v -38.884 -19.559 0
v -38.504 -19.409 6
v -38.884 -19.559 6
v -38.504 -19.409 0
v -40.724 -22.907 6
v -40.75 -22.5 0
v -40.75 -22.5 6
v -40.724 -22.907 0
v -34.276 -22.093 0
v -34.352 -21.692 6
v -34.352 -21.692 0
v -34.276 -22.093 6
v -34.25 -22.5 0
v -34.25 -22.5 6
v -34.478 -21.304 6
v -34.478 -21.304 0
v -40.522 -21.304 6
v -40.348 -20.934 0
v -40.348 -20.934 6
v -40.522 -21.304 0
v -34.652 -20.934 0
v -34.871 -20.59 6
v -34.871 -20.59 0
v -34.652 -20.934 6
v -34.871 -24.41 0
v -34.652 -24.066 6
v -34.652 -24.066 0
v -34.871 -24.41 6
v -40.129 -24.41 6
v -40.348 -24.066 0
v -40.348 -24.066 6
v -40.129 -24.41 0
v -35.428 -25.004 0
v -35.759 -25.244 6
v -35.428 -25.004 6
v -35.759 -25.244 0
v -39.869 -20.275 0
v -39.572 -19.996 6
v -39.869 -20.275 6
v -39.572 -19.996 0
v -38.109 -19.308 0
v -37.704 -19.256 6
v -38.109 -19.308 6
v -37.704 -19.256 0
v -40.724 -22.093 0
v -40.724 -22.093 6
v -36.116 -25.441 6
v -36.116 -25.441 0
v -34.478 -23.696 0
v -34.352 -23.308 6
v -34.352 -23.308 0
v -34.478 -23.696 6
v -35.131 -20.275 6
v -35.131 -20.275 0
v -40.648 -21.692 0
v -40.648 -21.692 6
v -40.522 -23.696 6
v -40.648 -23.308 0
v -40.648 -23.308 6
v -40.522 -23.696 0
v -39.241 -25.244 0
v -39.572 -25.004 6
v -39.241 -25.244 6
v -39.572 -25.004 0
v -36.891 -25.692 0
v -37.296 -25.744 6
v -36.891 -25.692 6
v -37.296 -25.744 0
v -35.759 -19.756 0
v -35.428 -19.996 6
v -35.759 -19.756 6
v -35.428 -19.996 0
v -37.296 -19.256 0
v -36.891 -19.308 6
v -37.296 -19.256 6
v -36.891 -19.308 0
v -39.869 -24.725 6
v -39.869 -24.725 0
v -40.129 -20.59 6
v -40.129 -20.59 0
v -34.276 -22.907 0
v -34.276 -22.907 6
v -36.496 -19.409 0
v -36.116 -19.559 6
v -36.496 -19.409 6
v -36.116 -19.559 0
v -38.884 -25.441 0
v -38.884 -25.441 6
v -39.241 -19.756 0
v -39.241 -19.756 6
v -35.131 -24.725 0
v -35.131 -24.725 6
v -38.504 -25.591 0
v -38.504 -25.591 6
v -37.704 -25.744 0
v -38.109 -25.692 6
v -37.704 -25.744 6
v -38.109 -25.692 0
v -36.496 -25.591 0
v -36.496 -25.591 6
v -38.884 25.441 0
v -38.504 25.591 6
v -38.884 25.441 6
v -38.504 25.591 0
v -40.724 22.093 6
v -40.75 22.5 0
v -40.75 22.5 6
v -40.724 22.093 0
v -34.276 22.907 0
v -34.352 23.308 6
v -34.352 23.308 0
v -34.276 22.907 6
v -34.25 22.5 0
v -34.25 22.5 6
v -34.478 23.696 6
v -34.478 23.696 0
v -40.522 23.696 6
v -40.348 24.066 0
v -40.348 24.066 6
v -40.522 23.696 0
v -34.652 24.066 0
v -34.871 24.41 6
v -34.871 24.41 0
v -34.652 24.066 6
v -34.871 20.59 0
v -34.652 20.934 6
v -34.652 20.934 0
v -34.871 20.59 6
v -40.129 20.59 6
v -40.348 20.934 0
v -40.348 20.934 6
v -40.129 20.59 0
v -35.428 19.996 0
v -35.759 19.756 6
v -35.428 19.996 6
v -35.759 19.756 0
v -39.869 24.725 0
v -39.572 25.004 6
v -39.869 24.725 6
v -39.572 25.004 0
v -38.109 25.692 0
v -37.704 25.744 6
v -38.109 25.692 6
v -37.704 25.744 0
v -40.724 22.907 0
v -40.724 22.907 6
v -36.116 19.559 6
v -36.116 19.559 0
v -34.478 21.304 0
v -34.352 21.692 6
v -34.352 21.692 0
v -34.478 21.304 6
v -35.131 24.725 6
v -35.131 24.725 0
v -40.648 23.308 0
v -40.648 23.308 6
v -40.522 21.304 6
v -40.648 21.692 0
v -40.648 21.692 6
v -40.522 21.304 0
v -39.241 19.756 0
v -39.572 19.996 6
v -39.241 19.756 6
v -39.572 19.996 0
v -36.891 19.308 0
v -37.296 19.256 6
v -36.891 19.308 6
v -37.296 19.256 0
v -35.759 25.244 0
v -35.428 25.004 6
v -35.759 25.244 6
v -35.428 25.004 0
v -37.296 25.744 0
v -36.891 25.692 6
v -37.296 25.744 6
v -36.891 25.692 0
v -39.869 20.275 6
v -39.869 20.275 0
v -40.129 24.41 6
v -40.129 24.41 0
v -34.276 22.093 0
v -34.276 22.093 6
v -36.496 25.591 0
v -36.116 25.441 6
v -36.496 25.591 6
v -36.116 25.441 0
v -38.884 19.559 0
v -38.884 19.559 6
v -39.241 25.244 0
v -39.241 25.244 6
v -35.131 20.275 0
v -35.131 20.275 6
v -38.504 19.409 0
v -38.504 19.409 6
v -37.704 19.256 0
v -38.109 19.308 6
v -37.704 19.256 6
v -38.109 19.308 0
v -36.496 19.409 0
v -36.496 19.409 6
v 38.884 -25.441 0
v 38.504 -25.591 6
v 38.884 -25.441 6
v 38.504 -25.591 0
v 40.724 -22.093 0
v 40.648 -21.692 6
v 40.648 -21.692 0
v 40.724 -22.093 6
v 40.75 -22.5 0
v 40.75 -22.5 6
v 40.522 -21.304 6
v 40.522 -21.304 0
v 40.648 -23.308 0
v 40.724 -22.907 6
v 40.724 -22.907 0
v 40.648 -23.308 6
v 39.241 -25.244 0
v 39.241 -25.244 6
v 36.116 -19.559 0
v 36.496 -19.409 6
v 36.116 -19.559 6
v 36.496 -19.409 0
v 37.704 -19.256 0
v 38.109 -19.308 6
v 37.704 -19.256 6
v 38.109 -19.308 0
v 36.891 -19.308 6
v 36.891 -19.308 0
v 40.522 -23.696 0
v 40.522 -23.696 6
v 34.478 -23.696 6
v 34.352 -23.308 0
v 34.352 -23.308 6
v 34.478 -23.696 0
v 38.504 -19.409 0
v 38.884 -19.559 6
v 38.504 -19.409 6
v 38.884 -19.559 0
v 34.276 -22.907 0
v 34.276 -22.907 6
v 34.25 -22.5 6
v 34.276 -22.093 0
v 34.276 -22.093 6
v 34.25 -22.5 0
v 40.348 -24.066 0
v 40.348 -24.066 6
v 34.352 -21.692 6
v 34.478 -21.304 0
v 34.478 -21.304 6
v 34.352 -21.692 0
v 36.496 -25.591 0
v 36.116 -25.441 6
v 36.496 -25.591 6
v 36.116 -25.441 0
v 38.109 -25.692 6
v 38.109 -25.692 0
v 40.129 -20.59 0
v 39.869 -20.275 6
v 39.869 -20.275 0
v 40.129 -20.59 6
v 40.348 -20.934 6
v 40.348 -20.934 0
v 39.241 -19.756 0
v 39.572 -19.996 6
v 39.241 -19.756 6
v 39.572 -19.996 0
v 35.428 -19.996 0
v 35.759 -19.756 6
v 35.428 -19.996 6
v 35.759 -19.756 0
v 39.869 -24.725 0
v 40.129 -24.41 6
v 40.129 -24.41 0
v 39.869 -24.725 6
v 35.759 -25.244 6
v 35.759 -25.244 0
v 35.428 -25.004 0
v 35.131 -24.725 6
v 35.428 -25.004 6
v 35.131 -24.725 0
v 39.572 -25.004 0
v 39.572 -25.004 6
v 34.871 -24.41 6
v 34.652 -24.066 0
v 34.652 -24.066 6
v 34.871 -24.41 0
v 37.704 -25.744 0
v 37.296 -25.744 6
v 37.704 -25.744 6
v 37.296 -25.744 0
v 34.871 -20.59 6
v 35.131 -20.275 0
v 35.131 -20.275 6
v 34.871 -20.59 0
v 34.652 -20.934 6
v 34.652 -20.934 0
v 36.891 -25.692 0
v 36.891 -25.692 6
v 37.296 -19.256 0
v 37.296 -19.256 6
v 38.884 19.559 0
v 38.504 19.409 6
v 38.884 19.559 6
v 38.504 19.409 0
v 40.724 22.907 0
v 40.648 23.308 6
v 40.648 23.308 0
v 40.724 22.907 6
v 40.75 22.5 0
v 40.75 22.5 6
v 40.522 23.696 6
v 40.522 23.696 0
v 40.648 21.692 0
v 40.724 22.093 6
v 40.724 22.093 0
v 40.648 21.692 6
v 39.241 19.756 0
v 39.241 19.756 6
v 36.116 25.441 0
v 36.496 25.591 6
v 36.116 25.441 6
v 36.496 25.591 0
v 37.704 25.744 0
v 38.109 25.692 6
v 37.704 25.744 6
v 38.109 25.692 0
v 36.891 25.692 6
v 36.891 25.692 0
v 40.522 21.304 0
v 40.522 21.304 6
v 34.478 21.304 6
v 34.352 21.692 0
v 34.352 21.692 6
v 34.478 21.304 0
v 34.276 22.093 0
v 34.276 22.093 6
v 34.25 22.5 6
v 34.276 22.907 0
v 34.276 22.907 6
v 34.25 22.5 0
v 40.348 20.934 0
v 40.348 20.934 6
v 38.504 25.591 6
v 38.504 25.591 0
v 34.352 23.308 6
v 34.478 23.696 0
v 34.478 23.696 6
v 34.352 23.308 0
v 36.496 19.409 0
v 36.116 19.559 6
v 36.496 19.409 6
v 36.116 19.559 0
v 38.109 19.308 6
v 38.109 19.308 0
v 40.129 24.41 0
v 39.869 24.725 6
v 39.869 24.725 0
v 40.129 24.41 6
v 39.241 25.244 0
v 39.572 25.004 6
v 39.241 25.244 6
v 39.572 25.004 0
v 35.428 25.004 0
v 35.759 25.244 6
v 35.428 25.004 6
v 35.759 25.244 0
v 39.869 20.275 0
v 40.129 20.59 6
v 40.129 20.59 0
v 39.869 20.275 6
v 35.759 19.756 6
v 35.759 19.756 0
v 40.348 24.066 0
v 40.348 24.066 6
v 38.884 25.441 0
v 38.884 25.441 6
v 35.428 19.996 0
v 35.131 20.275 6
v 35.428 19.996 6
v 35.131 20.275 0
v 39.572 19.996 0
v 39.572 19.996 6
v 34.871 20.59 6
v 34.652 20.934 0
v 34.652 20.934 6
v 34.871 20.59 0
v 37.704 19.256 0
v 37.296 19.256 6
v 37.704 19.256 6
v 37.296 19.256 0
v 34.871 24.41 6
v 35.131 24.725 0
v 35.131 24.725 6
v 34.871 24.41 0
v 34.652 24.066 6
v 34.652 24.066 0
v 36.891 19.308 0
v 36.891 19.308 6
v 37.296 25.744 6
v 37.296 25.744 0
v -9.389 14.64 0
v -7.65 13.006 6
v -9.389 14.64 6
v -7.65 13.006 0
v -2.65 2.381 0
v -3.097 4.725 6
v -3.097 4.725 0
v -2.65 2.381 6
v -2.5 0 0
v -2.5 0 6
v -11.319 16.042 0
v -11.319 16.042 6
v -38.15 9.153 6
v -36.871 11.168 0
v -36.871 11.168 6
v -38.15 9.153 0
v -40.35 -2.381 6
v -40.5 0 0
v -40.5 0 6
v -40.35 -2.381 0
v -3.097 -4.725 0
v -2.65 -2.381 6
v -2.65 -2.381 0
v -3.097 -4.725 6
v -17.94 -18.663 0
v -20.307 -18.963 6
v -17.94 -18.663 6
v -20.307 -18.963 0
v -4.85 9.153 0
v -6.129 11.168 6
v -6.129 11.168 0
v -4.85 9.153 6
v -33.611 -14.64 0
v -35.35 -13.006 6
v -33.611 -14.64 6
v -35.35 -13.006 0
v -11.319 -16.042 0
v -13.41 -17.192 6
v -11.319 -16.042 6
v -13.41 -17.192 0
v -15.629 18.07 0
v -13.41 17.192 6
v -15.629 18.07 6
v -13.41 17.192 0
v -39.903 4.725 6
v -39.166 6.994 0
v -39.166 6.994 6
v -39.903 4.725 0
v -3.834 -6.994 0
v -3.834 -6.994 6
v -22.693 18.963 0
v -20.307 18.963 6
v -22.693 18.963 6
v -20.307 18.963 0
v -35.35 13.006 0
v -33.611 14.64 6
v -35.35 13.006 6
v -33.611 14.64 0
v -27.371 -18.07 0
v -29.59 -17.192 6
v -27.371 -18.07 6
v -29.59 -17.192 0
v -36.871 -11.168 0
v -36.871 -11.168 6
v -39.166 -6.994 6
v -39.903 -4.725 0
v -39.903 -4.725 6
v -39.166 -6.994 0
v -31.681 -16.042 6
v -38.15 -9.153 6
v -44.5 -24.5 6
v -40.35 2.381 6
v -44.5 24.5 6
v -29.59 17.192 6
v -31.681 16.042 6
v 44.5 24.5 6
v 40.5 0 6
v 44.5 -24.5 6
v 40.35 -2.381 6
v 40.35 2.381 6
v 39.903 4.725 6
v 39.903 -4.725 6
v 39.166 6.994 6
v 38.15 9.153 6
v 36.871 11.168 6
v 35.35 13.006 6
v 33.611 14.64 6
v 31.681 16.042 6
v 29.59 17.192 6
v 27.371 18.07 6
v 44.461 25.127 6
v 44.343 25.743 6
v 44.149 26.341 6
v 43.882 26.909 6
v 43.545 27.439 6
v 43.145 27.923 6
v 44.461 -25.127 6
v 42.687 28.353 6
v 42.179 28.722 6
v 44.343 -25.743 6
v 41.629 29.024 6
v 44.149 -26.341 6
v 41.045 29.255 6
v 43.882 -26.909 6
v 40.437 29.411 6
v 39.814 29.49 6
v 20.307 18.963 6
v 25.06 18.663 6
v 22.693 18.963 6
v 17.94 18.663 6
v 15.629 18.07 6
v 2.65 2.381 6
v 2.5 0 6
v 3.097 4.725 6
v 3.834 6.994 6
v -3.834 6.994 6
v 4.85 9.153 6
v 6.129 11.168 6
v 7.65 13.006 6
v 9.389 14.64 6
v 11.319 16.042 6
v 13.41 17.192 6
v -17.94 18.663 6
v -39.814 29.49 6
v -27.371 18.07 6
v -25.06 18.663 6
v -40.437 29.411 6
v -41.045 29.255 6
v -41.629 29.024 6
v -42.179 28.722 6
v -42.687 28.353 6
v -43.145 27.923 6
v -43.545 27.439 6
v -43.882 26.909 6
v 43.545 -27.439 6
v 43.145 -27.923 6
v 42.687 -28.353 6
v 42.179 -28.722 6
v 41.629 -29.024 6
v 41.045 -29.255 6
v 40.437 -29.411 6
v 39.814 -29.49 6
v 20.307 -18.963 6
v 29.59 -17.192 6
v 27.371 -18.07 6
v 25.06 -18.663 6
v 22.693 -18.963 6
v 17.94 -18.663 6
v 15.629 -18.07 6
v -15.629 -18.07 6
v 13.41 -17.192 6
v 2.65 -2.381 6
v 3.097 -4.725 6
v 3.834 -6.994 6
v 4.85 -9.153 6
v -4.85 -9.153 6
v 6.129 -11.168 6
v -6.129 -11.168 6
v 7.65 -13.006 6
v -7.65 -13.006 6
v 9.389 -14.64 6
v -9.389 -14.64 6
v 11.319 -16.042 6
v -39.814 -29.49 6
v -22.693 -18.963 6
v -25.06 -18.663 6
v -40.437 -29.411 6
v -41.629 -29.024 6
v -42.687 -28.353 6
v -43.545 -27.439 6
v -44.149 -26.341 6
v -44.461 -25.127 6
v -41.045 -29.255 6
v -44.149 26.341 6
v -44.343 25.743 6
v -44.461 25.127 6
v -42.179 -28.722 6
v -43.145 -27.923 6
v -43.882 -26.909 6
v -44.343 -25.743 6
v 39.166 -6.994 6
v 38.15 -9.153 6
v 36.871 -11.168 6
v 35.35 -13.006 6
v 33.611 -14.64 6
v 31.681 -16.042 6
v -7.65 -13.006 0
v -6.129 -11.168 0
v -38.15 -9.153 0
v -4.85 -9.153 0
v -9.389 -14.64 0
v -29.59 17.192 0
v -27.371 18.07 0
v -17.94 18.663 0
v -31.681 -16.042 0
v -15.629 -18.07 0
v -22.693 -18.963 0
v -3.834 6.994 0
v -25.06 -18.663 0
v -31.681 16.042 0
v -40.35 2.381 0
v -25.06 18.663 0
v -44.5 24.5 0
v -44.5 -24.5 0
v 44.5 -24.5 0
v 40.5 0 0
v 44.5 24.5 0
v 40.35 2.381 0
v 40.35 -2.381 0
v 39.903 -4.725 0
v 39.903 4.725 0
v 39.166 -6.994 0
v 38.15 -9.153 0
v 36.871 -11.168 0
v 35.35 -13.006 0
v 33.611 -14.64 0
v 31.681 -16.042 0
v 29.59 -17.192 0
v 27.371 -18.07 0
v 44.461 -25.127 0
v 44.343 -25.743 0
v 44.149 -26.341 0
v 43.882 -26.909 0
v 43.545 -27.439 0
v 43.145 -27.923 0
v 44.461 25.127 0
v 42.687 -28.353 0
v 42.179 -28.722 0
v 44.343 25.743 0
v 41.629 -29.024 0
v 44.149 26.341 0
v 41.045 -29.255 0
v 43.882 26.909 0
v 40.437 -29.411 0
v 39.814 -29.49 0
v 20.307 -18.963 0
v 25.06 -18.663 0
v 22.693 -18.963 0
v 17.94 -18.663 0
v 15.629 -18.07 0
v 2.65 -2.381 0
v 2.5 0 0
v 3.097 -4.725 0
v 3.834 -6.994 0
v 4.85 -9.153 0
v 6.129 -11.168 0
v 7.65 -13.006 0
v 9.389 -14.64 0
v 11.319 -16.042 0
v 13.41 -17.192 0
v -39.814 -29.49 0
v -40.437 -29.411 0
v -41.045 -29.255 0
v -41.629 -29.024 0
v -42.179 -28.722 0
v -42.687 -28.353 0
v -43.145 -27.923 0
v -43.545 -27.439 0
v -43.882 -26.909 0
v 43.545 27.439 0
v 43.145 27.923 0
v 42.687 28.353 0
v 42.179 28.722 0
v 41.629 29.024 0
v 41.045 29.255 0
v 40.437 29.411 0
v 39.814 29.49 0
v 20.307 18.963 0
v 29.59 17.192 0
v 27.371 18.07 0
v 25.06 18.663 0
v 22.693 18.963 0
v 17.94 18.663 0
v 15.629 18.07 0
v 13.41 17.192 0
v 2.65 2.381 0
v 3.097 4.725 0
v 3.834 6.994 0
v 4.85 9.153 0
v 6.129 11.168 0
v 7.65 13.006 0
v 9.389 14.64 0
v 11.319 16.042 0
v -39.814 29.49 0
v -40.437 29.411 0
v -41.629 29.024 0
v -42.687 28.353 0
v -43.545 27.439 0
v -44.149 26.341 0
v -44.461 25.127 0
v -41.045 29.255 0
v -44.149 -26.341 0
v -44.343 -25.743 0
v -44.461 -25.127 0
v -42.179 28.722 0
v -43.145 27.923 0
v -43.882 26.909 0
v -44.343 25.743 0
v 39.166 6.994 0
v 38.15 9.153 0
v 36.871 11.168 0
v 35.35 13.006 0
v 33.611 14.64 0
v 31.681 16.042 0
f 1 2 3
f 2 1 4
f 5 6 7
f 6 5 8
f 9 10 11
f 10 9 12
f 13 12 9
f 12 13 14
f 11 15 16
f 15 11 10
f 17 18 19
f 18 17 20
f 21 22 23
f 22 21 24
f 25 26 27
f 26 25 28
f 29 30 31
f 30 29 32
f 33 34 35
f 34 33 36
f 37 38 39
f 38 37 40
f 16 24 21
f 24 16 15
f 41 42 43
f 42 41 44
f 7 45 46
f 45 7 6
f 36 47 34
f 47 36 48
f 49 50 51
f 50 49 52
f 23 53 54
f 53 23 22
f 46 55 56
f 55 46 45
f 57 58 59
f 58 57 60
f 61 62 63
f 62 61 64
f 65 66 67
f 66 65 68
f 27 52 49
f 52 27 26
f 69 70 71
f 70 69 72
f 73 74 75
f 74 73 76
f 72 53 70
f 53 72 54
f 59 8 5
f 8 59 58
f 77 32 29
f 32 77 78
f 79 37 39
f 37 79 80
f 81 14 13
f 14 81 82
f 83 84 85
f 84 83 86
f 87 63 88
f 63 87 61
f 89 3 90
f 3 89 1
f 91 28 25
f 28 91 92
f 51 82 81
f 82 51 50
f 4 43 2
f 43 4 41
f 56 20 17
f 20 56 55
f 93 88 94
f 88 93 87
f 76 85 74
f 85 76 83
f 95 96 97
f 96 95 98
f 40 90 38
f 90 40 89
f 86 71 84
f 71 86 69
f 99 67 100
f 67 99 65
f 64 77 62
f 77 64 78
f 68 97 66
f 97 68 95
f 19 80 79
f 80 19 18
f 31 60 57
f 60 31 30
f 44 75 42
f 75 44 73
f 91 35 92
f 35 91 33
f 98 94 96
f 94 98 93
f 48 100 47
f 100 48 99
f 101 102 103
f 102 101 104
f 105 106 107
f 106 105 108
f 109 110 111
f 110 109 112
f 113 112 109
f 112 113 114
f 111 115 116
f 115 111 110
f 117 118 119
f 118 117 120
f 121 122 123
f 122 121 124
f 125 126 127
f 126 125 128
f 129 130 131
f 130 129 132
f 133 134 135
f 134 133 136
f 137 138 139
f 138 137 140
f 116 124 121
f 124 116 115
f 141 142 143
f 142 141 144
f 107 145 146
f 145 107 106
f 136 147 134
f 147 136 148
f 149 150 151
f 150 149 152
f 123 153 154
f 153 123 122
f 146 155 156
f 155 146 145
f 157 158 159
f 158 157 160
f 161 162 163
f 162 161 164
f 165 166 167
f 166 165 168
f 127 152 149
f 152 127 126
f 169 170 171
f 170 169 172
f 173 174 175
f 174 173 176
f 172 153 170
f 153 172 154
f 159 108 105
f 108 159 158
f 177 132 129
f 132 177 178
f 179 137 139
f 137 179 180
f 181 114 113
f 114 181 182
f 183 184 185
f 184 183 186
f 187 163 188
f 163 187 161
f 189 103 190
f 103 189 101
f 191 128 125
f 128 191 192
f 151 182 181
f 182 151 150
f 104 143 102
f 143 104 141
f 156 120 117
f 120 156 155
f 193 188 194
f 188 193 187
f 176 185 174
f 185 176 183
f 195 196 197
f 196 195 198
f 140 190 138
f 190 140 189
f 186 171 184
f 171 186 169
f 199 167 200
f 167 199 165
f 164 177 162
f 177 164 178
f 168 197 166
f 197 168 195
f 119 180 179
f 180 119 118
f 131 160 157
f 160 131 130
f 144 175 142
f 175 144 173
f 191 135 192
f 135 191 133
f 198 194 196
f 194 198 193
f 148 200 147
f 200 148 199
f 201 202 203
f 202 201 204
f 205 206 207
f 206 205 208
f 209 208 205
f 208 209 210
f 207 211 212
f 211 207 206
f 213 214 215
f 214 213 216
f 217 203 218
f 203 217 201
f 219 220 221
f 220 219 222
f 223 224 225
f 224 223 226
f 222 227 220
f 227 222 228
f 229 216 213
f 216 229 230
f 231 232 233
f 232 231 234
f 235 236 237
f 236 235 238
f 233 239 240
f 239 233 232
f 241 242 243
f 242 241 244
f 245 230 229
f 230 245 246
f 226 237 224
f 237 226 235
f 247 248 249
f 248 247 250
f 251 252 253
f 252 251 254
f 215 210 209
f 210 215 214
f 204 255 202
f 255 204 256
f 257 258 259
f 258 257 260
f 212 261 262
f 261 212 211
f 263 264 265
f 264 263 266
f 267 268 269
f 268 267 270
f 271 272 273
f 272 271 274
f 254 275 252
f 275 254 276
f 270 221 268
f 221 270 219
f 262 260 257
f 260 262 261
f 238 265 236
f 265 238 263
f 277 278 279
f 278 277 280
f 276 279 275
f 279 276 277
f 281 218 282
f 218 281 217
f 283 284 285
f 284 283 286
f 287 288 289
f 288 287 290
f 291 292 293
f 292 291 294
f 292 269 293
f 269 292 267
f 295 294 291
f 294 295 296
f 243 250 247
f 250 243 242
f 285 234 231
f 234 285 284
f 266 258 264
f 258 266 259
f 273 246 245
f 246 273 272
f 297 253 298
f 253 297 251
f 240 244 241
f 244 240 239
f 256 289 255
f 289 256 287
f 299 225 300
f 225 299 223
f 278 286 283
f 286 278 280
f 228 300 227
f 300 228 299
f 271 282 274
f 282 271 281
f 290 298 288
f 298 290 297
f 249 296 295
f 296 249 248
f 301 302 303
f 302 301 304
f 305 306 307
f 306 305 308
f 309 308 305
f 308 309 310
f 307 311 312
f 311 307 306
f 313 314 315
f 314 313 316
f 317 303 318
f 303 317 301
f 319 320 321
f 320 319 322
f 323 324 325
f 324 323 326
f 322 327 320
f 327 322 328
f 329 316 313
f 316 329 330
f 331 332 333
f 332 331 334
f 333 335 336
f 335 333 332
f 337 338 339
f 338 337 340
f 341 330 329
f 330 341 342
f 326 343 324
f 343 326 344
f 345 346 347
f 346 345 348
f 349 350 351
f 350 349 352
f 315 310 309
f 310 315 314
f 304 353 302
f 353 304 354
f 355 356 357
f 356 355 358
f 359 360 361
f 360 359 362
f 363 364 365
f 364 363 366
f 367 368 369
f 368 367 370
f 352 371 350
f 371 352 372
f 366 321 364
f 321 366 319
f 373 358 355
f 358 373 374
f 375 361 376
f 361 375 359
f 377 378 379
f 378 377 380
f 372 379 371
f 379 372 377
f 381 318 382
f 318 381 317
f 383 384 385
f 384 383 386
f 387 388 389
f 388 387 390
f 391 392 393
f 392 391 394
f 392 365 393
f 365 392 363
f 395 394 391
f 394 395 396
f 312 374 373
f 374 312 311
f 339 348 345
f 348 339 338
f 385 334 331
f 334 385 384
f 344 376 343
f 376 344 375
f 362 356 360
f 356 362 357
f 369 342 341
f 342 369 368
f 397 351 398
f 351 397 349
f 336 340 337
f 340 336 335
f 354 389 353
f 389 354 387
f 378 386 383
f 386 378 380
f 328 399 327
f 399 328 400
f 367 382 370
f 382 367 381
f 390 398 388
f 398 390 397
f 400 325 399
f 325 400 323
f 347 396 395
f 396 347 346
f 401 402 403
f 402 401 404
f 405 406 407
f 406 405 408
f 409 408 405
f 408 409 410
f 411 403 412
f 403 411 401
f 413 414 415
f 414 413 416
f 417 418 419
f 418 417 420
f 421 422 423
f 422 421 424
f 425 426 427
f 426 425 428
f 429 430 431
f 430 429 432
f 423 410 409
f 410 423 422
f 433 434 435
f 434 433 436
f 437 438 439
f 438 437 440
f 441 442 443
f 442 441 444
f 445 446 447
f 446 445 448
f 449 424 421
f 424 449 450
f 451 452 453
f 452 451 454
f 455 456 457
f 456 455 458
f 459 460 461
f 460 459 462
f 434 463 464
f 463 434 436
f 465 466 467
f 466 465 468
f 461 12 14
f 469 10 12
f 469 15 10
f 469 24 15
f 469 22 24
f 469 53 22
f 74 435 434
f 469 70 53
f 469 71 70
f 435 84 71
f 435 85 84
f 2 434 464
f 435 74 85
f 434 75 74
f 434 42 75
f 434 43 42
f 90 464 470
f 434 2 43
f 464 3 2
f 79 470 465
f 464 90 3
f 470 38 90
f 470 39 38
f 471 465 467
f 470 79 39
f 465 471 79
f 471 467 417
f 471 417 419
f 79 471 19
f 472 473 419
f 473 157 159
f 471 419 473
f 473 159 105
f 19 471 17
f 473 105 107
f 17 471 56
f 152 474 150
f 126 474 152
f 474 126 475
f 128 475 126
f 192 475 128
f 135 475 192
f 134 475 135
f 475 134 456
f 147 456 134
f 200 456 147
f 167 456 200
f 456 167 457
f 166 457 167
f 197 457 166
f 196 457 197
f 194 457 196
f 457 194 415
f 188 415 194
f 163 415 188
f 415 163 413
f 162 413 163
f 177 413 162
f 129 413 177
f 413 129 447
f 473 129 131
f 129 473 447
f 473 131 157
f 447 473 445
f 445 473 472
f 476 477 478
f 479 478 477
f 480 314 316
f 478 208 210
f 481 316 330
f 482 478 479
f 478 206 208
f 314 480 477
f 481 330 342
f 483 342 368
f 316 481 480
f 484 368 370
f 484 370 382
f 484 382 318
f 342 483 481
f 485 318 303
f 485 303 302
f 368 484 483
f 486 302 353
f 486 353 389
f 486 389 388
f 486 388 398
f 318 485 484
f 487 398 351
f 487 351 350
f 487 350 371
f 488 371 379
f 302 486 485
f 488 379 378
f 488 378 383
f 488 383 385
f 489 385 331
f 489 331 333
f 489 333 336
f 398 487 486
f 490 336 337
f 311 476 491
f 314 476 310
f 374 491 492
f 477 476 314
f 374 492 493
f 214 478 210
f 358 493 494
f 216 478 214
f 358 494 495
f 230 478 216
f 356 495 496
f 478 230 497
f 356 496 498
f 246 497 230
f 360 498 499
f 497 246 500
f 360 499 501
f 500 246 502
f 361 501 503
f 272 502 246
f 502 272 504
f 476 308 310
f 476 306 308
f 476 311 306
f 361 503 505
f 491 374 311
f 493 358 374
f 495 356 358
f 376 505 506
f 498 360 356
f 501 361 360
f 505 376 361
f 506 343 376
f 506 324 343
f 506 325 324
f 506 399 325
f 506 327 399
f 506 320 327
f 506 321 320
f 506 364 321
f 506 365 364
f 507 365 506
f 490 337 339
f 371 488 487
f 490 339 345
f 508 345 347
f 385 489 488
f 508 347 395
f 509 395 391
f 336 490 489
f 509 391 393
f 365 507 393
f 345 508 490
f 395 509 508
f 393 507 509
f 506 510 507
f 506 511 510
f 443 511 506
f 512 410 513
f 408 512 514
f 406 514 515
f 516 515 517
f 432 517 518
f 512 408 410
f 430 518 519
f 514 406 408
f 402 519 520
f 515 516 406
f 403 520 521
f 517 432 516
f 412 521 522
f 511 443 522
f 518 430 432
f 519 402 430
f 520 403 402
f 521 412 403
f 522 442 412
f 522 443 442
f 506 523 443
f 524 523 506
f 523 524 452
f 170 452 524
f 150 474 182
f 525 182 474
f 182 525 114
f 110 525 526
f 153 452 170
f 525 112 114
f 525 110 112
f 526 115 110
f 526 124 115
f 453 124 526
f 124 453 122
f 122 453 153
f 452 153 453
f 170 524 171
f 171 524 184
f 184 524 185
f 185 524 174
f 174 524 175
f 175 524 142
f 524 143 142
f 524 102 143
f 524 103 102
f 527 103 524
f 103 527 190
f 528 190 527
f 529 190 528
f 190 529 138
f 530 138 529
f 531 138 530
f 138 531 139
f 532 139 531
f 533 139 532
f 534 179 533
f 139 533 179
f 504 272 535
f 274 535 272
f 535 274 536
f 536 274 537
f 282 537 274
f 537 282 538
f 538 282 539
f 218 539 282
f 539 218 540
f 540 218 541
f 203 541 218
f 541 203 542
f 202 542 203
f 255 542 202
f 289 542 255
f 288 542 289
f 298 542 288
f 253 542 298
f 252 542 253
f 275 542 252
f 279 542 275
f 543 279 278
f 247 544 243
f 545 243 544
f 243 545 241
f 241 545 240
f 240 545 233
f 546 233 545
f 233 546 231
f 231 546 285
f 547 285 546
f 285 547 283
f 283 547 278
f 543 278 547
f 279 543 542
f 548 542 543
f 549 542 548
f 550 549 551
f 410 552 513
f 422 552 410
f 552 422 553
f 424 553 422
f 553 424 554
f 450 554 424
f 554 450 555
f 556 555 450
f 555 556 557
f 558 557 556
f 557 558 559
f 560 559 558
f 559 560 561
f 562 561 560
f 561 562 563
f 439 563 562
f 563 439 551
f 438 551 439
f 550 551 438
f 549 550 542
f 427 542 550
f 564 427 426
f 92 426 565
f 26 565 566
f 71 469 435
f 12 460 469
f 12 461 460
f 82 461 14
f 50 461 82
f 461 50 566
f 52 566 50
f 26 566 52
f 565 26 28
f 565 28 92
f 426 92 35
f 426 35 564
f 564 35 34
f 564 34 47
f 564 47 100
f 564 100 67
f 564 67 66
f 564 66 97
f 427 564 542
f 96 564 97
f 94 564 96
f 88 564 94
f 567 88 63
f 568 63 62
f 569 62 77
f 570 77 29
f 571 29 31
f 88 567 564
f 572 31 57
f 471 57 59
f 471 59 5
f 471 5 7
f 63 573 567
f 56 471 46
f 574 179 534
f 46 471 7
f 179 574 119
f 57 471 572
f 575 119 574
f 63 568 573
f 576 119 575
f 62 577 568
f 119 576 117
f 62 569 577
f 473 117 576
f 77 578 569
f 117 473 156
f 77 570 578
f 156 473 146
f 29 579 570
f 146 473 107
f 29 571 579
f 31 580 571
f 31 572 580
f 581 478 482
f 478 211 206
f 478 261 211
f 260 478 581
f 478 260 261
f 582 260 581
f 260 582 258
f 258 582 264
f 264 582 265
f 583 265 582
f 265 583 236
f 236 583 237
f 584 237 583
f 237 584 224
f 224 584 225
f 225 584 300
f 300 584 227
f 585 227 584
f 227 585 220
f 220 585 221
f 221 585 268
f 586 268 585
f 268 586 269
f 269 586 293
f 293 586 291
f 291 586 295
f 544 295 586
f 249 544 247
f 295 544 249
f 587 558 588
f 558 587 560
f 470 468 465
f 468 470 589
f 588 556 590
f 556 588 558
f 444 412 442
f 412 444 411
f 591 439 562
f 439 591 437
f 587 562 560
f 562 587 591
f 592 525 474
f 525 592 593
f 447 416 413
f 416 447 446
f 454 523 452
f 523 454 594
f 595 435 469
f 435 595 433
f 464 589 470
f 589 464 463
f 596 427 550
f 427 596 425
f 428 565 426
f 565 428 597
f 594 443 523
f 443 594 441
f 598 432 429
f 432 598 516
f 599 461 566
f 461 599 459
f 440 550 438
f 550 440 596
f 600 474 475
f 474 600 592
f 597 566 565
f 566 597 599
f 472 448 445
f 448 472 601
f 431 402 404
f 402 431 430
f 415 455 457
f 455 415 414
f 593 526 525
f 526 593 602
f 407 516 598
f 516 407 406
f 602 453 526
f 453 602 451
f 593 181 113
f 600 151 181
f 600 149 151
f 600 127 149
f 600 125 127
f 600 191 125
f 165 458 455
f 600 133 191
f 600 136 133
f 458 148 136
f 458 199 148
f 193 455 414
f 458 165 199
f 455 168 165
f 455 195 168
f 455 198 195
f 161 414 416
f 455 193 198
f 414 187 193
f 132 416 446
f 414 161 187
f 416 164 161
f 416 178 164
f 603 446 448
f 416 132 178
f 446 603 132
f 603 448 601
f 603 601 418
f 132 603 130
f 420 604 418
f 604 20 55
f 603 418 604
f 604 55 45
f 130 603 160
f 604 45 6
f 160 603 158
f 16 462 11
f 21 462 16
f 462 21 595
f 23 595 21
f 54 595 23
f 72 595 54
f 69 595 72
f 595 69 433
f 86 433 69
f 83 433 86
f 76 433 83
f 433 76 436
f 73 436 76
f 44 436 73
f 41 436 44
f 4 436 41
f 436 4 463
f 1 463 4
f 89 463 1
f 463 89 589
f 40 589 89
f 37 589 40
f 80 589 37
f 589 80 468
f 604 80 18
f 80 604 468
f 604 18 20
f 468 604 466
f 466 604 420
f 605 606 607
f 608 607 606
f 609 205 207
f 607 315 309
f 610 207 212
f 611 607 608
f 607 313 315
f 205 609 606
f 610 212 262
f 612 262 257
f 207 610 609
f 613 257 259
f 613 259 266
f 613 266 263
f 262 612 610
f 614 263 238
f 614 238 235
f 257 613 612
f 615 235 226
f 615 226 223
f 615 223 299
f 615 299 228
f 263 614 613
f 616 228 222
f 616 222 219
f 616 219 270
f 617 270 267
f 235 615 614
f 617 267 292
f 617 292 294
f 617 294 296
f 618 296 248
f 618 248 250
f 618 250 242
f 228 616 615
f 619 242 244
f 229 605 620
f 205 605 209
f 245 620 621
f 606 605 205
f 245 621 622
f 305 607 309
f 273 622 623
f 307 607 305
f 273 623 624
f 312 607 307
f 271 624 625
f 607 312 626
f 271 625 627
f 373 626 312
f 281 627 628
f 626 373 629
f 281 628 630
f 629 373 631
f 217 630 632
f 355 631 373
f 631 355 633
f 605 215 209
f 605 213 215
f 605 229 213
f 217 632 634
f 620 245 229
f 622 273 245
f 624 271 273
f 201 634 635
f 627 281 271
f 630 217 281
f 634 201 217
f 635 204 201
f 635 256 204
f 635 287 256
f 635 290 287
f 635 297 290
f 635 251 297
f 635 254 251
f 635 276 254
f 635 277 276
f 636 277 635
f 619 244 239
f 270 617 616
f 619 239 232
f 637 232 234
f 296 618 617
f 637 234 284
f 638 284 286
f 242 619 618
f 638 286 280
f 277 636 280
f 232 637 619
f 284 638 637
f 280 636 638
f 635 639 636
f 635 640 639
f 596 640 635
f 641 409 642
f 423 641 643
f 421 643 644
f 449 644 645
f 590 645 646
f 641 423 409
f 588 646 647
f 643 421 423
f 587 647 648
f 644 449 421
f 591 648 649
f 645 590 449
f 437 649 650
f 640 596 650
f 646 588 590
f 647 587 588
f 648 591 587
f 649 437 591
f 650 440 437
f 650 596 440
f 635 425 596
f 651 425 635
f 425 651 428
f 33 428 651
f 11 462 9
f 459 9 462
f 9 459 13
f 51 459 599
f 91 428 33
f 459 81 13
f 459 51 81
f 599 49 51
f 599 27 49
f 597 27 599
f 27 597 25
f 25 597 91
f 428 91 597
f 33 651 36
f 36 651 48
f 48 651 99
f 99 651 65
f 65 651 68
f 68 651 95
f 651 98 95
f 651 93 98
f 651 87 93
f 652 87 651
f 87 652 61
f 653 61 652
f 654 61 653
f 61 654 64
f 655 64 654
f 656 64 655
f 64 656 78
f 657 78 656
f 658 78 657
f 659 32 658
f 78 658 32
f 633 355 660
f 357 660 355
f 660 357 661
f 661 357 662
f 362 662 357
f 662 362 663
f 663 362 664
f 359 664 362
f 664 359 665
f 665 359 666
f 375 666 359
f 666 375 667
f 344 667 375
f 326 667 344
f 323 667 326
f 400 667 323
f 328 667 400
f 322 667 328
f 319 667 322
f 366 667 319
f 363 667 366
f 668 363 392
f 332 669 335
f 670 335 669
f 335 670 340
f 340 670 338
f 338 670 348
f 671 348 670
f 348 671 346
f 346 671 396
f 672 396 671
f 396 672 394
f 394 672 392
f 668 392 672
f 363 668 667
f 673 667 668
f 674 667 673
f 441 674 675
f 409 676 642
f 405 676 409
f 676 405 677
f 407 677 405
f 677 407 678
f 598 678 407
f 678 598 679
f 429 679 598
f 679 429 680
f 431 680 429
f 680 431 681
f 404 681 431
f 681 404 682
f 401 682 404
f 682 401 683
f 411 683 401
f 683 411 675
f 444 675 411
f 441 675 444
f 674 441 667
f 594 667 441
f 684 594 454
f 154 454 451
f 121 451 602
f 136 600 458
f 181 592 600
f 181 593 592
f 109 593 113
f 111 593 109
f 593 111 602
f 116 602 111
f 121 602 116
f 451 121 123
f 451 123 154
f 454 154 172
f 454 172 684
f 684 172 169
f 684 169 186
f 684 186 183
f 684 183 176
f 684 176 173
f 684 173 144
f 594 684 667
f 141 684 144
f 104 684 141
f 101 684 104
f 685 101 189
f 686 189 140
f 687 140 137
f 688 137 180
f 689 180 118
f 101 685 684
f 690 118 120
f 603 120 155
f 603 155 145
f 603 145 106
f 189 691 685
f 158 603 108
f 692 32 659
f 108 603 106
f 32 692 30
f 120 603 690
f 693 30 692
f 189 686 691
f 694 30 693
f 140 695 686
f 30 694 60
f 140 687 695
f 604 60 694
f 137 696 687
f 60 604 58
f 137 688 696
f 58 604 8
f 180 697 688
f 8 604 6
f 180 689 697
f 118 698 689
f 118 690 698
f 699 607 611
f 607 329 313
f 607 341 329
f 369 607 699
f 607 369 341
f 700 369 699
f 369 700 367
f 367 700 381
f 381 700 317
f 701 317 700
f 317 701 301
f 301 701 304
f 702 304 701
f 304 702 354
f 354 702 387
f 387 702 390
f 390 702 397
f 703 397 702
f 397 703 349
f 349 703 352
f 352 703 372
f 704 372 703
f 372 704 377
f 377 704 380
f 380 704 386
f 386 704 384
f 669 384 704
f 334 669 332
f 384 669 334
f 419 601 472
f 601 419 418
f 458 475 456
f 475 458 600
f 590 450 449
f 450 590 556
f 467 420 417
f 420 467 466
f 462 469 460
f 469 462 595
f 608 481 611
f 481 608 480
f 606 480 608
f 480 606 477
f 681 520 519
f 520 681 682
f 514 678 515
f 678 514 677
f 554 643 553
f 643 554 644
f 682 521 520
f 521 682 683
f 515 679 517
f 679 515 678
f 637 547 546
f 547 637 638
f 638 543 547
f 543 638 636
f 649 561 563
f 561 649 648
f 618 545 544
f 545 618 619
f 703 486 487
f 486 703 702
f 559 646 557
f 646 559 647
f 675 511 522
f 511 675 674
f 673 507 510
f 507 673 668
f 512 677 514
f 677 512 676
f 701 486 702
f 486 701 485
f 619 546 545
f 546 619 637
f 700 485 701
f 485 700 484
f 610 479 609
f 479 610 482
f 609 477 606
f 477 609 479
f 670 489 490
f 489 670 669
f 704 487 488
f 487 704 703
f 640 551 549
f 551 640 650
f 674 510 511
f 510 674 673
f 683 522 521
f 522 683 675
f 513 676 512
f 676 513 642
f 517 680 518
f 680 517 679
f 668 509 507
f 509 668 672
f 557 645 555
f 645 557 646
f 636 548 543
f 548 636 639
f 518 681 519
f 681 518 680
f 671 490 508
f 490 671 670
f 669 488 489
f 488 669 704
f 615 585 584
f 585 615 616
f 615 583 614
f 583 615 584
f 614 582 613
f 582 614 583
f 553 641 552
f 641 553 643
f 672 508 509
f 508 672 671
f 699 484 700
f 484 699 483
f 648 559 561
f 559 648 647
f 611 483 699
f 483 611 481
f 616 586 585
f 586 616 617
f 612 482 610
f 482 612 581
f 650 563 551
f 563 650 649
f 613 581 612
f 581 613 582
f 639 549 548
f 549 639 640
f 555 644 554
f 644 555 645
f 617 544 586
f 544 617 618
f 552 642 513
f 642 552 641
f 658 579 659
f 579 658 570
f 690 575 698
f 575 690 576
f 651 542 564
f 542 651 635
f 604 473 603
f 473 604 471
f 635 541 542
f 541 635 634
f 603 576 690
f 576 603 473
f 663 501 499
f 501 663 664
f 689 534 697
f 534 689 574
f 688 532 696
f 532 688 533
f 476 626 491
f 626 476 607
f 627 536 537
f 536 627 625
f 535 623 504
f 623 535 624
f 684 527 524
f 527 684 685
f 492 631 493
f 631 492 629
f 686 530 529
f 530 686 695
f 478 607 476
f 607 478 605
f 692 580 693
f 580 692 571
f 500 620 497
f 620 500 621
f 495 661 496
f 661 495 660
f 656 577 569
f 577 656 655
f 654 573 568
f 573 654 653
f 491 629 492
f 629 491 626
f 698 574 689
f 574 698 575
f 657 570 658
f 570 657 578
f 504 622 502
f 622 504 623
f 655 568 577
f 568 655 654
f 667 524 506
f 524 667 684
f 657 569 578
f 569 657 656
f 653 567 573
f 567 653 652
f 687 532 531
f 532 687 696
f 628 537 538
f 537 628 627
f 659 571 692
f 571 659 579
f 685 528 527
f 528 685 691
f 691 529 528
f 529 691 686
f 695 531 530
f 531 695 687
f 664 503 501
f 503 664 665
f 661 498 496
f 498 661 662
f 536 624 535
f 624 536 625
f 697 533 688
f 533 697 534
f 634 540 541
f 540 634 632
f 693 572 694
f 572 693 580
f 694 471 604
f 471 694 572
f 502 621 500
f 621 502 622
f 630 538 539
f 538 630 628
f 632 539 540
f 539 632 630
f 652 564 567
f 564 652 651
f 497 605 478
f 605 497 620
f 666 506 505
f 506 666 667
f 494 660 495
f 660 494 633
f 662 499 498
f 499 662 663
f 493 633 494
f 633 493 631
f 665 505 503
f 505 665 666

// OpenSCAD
$fn = 50;


difference() {
	union() {
		hull() {
			translate(v = [-39.5000000000, 24.5000000000, 0]) {
				cylinder(h = 6, r = 5);
			}
			translate(v = [39.5000000000, 24.5000000000, 0]) {
				cylinder(h = 6, r = 5);
			}
			translate(v = [-39.5000000000, -24.5000000000, 0]) {
				cylinder(h = 6, r = 5);
			}
			translate(v = [39.5000000000, -24.5000000000, 0]) {
				cylinder(h = 6, r = 5);
			}
		}
	}
	union() {
		#translate(v = [-37.5000000000, -22.5000000000, -100.0000000000]) {
			cylinder(h = 200, r = 3.2500000000);
		}
		#translate(v = [-37.5000000000, 22.5000000000, -100.0000000000]) {
			cylinder(h = 200, r = 3.2500000000);
		}
		#translate(v = [37.5000000000, -22.5000000000, -100.0000000000]) {
			cylinder(h = 200, r = 3.2500000000);
		}
		#translate(v = [37.5000000000, 22.5000000000, -100.0000000000]) {
			cylinder(h = 200, r = 3.2500000000);
		}
		#translate(v = [-21.5000000000, 0, 0]) {
			cylinder(h = 6, r = 19.0000000000);
		}
		#translate(v = [21.5000000000, 0, 0]) {
			cylinder(h = 6, r = 19.0000000000);
		}
	}
}
